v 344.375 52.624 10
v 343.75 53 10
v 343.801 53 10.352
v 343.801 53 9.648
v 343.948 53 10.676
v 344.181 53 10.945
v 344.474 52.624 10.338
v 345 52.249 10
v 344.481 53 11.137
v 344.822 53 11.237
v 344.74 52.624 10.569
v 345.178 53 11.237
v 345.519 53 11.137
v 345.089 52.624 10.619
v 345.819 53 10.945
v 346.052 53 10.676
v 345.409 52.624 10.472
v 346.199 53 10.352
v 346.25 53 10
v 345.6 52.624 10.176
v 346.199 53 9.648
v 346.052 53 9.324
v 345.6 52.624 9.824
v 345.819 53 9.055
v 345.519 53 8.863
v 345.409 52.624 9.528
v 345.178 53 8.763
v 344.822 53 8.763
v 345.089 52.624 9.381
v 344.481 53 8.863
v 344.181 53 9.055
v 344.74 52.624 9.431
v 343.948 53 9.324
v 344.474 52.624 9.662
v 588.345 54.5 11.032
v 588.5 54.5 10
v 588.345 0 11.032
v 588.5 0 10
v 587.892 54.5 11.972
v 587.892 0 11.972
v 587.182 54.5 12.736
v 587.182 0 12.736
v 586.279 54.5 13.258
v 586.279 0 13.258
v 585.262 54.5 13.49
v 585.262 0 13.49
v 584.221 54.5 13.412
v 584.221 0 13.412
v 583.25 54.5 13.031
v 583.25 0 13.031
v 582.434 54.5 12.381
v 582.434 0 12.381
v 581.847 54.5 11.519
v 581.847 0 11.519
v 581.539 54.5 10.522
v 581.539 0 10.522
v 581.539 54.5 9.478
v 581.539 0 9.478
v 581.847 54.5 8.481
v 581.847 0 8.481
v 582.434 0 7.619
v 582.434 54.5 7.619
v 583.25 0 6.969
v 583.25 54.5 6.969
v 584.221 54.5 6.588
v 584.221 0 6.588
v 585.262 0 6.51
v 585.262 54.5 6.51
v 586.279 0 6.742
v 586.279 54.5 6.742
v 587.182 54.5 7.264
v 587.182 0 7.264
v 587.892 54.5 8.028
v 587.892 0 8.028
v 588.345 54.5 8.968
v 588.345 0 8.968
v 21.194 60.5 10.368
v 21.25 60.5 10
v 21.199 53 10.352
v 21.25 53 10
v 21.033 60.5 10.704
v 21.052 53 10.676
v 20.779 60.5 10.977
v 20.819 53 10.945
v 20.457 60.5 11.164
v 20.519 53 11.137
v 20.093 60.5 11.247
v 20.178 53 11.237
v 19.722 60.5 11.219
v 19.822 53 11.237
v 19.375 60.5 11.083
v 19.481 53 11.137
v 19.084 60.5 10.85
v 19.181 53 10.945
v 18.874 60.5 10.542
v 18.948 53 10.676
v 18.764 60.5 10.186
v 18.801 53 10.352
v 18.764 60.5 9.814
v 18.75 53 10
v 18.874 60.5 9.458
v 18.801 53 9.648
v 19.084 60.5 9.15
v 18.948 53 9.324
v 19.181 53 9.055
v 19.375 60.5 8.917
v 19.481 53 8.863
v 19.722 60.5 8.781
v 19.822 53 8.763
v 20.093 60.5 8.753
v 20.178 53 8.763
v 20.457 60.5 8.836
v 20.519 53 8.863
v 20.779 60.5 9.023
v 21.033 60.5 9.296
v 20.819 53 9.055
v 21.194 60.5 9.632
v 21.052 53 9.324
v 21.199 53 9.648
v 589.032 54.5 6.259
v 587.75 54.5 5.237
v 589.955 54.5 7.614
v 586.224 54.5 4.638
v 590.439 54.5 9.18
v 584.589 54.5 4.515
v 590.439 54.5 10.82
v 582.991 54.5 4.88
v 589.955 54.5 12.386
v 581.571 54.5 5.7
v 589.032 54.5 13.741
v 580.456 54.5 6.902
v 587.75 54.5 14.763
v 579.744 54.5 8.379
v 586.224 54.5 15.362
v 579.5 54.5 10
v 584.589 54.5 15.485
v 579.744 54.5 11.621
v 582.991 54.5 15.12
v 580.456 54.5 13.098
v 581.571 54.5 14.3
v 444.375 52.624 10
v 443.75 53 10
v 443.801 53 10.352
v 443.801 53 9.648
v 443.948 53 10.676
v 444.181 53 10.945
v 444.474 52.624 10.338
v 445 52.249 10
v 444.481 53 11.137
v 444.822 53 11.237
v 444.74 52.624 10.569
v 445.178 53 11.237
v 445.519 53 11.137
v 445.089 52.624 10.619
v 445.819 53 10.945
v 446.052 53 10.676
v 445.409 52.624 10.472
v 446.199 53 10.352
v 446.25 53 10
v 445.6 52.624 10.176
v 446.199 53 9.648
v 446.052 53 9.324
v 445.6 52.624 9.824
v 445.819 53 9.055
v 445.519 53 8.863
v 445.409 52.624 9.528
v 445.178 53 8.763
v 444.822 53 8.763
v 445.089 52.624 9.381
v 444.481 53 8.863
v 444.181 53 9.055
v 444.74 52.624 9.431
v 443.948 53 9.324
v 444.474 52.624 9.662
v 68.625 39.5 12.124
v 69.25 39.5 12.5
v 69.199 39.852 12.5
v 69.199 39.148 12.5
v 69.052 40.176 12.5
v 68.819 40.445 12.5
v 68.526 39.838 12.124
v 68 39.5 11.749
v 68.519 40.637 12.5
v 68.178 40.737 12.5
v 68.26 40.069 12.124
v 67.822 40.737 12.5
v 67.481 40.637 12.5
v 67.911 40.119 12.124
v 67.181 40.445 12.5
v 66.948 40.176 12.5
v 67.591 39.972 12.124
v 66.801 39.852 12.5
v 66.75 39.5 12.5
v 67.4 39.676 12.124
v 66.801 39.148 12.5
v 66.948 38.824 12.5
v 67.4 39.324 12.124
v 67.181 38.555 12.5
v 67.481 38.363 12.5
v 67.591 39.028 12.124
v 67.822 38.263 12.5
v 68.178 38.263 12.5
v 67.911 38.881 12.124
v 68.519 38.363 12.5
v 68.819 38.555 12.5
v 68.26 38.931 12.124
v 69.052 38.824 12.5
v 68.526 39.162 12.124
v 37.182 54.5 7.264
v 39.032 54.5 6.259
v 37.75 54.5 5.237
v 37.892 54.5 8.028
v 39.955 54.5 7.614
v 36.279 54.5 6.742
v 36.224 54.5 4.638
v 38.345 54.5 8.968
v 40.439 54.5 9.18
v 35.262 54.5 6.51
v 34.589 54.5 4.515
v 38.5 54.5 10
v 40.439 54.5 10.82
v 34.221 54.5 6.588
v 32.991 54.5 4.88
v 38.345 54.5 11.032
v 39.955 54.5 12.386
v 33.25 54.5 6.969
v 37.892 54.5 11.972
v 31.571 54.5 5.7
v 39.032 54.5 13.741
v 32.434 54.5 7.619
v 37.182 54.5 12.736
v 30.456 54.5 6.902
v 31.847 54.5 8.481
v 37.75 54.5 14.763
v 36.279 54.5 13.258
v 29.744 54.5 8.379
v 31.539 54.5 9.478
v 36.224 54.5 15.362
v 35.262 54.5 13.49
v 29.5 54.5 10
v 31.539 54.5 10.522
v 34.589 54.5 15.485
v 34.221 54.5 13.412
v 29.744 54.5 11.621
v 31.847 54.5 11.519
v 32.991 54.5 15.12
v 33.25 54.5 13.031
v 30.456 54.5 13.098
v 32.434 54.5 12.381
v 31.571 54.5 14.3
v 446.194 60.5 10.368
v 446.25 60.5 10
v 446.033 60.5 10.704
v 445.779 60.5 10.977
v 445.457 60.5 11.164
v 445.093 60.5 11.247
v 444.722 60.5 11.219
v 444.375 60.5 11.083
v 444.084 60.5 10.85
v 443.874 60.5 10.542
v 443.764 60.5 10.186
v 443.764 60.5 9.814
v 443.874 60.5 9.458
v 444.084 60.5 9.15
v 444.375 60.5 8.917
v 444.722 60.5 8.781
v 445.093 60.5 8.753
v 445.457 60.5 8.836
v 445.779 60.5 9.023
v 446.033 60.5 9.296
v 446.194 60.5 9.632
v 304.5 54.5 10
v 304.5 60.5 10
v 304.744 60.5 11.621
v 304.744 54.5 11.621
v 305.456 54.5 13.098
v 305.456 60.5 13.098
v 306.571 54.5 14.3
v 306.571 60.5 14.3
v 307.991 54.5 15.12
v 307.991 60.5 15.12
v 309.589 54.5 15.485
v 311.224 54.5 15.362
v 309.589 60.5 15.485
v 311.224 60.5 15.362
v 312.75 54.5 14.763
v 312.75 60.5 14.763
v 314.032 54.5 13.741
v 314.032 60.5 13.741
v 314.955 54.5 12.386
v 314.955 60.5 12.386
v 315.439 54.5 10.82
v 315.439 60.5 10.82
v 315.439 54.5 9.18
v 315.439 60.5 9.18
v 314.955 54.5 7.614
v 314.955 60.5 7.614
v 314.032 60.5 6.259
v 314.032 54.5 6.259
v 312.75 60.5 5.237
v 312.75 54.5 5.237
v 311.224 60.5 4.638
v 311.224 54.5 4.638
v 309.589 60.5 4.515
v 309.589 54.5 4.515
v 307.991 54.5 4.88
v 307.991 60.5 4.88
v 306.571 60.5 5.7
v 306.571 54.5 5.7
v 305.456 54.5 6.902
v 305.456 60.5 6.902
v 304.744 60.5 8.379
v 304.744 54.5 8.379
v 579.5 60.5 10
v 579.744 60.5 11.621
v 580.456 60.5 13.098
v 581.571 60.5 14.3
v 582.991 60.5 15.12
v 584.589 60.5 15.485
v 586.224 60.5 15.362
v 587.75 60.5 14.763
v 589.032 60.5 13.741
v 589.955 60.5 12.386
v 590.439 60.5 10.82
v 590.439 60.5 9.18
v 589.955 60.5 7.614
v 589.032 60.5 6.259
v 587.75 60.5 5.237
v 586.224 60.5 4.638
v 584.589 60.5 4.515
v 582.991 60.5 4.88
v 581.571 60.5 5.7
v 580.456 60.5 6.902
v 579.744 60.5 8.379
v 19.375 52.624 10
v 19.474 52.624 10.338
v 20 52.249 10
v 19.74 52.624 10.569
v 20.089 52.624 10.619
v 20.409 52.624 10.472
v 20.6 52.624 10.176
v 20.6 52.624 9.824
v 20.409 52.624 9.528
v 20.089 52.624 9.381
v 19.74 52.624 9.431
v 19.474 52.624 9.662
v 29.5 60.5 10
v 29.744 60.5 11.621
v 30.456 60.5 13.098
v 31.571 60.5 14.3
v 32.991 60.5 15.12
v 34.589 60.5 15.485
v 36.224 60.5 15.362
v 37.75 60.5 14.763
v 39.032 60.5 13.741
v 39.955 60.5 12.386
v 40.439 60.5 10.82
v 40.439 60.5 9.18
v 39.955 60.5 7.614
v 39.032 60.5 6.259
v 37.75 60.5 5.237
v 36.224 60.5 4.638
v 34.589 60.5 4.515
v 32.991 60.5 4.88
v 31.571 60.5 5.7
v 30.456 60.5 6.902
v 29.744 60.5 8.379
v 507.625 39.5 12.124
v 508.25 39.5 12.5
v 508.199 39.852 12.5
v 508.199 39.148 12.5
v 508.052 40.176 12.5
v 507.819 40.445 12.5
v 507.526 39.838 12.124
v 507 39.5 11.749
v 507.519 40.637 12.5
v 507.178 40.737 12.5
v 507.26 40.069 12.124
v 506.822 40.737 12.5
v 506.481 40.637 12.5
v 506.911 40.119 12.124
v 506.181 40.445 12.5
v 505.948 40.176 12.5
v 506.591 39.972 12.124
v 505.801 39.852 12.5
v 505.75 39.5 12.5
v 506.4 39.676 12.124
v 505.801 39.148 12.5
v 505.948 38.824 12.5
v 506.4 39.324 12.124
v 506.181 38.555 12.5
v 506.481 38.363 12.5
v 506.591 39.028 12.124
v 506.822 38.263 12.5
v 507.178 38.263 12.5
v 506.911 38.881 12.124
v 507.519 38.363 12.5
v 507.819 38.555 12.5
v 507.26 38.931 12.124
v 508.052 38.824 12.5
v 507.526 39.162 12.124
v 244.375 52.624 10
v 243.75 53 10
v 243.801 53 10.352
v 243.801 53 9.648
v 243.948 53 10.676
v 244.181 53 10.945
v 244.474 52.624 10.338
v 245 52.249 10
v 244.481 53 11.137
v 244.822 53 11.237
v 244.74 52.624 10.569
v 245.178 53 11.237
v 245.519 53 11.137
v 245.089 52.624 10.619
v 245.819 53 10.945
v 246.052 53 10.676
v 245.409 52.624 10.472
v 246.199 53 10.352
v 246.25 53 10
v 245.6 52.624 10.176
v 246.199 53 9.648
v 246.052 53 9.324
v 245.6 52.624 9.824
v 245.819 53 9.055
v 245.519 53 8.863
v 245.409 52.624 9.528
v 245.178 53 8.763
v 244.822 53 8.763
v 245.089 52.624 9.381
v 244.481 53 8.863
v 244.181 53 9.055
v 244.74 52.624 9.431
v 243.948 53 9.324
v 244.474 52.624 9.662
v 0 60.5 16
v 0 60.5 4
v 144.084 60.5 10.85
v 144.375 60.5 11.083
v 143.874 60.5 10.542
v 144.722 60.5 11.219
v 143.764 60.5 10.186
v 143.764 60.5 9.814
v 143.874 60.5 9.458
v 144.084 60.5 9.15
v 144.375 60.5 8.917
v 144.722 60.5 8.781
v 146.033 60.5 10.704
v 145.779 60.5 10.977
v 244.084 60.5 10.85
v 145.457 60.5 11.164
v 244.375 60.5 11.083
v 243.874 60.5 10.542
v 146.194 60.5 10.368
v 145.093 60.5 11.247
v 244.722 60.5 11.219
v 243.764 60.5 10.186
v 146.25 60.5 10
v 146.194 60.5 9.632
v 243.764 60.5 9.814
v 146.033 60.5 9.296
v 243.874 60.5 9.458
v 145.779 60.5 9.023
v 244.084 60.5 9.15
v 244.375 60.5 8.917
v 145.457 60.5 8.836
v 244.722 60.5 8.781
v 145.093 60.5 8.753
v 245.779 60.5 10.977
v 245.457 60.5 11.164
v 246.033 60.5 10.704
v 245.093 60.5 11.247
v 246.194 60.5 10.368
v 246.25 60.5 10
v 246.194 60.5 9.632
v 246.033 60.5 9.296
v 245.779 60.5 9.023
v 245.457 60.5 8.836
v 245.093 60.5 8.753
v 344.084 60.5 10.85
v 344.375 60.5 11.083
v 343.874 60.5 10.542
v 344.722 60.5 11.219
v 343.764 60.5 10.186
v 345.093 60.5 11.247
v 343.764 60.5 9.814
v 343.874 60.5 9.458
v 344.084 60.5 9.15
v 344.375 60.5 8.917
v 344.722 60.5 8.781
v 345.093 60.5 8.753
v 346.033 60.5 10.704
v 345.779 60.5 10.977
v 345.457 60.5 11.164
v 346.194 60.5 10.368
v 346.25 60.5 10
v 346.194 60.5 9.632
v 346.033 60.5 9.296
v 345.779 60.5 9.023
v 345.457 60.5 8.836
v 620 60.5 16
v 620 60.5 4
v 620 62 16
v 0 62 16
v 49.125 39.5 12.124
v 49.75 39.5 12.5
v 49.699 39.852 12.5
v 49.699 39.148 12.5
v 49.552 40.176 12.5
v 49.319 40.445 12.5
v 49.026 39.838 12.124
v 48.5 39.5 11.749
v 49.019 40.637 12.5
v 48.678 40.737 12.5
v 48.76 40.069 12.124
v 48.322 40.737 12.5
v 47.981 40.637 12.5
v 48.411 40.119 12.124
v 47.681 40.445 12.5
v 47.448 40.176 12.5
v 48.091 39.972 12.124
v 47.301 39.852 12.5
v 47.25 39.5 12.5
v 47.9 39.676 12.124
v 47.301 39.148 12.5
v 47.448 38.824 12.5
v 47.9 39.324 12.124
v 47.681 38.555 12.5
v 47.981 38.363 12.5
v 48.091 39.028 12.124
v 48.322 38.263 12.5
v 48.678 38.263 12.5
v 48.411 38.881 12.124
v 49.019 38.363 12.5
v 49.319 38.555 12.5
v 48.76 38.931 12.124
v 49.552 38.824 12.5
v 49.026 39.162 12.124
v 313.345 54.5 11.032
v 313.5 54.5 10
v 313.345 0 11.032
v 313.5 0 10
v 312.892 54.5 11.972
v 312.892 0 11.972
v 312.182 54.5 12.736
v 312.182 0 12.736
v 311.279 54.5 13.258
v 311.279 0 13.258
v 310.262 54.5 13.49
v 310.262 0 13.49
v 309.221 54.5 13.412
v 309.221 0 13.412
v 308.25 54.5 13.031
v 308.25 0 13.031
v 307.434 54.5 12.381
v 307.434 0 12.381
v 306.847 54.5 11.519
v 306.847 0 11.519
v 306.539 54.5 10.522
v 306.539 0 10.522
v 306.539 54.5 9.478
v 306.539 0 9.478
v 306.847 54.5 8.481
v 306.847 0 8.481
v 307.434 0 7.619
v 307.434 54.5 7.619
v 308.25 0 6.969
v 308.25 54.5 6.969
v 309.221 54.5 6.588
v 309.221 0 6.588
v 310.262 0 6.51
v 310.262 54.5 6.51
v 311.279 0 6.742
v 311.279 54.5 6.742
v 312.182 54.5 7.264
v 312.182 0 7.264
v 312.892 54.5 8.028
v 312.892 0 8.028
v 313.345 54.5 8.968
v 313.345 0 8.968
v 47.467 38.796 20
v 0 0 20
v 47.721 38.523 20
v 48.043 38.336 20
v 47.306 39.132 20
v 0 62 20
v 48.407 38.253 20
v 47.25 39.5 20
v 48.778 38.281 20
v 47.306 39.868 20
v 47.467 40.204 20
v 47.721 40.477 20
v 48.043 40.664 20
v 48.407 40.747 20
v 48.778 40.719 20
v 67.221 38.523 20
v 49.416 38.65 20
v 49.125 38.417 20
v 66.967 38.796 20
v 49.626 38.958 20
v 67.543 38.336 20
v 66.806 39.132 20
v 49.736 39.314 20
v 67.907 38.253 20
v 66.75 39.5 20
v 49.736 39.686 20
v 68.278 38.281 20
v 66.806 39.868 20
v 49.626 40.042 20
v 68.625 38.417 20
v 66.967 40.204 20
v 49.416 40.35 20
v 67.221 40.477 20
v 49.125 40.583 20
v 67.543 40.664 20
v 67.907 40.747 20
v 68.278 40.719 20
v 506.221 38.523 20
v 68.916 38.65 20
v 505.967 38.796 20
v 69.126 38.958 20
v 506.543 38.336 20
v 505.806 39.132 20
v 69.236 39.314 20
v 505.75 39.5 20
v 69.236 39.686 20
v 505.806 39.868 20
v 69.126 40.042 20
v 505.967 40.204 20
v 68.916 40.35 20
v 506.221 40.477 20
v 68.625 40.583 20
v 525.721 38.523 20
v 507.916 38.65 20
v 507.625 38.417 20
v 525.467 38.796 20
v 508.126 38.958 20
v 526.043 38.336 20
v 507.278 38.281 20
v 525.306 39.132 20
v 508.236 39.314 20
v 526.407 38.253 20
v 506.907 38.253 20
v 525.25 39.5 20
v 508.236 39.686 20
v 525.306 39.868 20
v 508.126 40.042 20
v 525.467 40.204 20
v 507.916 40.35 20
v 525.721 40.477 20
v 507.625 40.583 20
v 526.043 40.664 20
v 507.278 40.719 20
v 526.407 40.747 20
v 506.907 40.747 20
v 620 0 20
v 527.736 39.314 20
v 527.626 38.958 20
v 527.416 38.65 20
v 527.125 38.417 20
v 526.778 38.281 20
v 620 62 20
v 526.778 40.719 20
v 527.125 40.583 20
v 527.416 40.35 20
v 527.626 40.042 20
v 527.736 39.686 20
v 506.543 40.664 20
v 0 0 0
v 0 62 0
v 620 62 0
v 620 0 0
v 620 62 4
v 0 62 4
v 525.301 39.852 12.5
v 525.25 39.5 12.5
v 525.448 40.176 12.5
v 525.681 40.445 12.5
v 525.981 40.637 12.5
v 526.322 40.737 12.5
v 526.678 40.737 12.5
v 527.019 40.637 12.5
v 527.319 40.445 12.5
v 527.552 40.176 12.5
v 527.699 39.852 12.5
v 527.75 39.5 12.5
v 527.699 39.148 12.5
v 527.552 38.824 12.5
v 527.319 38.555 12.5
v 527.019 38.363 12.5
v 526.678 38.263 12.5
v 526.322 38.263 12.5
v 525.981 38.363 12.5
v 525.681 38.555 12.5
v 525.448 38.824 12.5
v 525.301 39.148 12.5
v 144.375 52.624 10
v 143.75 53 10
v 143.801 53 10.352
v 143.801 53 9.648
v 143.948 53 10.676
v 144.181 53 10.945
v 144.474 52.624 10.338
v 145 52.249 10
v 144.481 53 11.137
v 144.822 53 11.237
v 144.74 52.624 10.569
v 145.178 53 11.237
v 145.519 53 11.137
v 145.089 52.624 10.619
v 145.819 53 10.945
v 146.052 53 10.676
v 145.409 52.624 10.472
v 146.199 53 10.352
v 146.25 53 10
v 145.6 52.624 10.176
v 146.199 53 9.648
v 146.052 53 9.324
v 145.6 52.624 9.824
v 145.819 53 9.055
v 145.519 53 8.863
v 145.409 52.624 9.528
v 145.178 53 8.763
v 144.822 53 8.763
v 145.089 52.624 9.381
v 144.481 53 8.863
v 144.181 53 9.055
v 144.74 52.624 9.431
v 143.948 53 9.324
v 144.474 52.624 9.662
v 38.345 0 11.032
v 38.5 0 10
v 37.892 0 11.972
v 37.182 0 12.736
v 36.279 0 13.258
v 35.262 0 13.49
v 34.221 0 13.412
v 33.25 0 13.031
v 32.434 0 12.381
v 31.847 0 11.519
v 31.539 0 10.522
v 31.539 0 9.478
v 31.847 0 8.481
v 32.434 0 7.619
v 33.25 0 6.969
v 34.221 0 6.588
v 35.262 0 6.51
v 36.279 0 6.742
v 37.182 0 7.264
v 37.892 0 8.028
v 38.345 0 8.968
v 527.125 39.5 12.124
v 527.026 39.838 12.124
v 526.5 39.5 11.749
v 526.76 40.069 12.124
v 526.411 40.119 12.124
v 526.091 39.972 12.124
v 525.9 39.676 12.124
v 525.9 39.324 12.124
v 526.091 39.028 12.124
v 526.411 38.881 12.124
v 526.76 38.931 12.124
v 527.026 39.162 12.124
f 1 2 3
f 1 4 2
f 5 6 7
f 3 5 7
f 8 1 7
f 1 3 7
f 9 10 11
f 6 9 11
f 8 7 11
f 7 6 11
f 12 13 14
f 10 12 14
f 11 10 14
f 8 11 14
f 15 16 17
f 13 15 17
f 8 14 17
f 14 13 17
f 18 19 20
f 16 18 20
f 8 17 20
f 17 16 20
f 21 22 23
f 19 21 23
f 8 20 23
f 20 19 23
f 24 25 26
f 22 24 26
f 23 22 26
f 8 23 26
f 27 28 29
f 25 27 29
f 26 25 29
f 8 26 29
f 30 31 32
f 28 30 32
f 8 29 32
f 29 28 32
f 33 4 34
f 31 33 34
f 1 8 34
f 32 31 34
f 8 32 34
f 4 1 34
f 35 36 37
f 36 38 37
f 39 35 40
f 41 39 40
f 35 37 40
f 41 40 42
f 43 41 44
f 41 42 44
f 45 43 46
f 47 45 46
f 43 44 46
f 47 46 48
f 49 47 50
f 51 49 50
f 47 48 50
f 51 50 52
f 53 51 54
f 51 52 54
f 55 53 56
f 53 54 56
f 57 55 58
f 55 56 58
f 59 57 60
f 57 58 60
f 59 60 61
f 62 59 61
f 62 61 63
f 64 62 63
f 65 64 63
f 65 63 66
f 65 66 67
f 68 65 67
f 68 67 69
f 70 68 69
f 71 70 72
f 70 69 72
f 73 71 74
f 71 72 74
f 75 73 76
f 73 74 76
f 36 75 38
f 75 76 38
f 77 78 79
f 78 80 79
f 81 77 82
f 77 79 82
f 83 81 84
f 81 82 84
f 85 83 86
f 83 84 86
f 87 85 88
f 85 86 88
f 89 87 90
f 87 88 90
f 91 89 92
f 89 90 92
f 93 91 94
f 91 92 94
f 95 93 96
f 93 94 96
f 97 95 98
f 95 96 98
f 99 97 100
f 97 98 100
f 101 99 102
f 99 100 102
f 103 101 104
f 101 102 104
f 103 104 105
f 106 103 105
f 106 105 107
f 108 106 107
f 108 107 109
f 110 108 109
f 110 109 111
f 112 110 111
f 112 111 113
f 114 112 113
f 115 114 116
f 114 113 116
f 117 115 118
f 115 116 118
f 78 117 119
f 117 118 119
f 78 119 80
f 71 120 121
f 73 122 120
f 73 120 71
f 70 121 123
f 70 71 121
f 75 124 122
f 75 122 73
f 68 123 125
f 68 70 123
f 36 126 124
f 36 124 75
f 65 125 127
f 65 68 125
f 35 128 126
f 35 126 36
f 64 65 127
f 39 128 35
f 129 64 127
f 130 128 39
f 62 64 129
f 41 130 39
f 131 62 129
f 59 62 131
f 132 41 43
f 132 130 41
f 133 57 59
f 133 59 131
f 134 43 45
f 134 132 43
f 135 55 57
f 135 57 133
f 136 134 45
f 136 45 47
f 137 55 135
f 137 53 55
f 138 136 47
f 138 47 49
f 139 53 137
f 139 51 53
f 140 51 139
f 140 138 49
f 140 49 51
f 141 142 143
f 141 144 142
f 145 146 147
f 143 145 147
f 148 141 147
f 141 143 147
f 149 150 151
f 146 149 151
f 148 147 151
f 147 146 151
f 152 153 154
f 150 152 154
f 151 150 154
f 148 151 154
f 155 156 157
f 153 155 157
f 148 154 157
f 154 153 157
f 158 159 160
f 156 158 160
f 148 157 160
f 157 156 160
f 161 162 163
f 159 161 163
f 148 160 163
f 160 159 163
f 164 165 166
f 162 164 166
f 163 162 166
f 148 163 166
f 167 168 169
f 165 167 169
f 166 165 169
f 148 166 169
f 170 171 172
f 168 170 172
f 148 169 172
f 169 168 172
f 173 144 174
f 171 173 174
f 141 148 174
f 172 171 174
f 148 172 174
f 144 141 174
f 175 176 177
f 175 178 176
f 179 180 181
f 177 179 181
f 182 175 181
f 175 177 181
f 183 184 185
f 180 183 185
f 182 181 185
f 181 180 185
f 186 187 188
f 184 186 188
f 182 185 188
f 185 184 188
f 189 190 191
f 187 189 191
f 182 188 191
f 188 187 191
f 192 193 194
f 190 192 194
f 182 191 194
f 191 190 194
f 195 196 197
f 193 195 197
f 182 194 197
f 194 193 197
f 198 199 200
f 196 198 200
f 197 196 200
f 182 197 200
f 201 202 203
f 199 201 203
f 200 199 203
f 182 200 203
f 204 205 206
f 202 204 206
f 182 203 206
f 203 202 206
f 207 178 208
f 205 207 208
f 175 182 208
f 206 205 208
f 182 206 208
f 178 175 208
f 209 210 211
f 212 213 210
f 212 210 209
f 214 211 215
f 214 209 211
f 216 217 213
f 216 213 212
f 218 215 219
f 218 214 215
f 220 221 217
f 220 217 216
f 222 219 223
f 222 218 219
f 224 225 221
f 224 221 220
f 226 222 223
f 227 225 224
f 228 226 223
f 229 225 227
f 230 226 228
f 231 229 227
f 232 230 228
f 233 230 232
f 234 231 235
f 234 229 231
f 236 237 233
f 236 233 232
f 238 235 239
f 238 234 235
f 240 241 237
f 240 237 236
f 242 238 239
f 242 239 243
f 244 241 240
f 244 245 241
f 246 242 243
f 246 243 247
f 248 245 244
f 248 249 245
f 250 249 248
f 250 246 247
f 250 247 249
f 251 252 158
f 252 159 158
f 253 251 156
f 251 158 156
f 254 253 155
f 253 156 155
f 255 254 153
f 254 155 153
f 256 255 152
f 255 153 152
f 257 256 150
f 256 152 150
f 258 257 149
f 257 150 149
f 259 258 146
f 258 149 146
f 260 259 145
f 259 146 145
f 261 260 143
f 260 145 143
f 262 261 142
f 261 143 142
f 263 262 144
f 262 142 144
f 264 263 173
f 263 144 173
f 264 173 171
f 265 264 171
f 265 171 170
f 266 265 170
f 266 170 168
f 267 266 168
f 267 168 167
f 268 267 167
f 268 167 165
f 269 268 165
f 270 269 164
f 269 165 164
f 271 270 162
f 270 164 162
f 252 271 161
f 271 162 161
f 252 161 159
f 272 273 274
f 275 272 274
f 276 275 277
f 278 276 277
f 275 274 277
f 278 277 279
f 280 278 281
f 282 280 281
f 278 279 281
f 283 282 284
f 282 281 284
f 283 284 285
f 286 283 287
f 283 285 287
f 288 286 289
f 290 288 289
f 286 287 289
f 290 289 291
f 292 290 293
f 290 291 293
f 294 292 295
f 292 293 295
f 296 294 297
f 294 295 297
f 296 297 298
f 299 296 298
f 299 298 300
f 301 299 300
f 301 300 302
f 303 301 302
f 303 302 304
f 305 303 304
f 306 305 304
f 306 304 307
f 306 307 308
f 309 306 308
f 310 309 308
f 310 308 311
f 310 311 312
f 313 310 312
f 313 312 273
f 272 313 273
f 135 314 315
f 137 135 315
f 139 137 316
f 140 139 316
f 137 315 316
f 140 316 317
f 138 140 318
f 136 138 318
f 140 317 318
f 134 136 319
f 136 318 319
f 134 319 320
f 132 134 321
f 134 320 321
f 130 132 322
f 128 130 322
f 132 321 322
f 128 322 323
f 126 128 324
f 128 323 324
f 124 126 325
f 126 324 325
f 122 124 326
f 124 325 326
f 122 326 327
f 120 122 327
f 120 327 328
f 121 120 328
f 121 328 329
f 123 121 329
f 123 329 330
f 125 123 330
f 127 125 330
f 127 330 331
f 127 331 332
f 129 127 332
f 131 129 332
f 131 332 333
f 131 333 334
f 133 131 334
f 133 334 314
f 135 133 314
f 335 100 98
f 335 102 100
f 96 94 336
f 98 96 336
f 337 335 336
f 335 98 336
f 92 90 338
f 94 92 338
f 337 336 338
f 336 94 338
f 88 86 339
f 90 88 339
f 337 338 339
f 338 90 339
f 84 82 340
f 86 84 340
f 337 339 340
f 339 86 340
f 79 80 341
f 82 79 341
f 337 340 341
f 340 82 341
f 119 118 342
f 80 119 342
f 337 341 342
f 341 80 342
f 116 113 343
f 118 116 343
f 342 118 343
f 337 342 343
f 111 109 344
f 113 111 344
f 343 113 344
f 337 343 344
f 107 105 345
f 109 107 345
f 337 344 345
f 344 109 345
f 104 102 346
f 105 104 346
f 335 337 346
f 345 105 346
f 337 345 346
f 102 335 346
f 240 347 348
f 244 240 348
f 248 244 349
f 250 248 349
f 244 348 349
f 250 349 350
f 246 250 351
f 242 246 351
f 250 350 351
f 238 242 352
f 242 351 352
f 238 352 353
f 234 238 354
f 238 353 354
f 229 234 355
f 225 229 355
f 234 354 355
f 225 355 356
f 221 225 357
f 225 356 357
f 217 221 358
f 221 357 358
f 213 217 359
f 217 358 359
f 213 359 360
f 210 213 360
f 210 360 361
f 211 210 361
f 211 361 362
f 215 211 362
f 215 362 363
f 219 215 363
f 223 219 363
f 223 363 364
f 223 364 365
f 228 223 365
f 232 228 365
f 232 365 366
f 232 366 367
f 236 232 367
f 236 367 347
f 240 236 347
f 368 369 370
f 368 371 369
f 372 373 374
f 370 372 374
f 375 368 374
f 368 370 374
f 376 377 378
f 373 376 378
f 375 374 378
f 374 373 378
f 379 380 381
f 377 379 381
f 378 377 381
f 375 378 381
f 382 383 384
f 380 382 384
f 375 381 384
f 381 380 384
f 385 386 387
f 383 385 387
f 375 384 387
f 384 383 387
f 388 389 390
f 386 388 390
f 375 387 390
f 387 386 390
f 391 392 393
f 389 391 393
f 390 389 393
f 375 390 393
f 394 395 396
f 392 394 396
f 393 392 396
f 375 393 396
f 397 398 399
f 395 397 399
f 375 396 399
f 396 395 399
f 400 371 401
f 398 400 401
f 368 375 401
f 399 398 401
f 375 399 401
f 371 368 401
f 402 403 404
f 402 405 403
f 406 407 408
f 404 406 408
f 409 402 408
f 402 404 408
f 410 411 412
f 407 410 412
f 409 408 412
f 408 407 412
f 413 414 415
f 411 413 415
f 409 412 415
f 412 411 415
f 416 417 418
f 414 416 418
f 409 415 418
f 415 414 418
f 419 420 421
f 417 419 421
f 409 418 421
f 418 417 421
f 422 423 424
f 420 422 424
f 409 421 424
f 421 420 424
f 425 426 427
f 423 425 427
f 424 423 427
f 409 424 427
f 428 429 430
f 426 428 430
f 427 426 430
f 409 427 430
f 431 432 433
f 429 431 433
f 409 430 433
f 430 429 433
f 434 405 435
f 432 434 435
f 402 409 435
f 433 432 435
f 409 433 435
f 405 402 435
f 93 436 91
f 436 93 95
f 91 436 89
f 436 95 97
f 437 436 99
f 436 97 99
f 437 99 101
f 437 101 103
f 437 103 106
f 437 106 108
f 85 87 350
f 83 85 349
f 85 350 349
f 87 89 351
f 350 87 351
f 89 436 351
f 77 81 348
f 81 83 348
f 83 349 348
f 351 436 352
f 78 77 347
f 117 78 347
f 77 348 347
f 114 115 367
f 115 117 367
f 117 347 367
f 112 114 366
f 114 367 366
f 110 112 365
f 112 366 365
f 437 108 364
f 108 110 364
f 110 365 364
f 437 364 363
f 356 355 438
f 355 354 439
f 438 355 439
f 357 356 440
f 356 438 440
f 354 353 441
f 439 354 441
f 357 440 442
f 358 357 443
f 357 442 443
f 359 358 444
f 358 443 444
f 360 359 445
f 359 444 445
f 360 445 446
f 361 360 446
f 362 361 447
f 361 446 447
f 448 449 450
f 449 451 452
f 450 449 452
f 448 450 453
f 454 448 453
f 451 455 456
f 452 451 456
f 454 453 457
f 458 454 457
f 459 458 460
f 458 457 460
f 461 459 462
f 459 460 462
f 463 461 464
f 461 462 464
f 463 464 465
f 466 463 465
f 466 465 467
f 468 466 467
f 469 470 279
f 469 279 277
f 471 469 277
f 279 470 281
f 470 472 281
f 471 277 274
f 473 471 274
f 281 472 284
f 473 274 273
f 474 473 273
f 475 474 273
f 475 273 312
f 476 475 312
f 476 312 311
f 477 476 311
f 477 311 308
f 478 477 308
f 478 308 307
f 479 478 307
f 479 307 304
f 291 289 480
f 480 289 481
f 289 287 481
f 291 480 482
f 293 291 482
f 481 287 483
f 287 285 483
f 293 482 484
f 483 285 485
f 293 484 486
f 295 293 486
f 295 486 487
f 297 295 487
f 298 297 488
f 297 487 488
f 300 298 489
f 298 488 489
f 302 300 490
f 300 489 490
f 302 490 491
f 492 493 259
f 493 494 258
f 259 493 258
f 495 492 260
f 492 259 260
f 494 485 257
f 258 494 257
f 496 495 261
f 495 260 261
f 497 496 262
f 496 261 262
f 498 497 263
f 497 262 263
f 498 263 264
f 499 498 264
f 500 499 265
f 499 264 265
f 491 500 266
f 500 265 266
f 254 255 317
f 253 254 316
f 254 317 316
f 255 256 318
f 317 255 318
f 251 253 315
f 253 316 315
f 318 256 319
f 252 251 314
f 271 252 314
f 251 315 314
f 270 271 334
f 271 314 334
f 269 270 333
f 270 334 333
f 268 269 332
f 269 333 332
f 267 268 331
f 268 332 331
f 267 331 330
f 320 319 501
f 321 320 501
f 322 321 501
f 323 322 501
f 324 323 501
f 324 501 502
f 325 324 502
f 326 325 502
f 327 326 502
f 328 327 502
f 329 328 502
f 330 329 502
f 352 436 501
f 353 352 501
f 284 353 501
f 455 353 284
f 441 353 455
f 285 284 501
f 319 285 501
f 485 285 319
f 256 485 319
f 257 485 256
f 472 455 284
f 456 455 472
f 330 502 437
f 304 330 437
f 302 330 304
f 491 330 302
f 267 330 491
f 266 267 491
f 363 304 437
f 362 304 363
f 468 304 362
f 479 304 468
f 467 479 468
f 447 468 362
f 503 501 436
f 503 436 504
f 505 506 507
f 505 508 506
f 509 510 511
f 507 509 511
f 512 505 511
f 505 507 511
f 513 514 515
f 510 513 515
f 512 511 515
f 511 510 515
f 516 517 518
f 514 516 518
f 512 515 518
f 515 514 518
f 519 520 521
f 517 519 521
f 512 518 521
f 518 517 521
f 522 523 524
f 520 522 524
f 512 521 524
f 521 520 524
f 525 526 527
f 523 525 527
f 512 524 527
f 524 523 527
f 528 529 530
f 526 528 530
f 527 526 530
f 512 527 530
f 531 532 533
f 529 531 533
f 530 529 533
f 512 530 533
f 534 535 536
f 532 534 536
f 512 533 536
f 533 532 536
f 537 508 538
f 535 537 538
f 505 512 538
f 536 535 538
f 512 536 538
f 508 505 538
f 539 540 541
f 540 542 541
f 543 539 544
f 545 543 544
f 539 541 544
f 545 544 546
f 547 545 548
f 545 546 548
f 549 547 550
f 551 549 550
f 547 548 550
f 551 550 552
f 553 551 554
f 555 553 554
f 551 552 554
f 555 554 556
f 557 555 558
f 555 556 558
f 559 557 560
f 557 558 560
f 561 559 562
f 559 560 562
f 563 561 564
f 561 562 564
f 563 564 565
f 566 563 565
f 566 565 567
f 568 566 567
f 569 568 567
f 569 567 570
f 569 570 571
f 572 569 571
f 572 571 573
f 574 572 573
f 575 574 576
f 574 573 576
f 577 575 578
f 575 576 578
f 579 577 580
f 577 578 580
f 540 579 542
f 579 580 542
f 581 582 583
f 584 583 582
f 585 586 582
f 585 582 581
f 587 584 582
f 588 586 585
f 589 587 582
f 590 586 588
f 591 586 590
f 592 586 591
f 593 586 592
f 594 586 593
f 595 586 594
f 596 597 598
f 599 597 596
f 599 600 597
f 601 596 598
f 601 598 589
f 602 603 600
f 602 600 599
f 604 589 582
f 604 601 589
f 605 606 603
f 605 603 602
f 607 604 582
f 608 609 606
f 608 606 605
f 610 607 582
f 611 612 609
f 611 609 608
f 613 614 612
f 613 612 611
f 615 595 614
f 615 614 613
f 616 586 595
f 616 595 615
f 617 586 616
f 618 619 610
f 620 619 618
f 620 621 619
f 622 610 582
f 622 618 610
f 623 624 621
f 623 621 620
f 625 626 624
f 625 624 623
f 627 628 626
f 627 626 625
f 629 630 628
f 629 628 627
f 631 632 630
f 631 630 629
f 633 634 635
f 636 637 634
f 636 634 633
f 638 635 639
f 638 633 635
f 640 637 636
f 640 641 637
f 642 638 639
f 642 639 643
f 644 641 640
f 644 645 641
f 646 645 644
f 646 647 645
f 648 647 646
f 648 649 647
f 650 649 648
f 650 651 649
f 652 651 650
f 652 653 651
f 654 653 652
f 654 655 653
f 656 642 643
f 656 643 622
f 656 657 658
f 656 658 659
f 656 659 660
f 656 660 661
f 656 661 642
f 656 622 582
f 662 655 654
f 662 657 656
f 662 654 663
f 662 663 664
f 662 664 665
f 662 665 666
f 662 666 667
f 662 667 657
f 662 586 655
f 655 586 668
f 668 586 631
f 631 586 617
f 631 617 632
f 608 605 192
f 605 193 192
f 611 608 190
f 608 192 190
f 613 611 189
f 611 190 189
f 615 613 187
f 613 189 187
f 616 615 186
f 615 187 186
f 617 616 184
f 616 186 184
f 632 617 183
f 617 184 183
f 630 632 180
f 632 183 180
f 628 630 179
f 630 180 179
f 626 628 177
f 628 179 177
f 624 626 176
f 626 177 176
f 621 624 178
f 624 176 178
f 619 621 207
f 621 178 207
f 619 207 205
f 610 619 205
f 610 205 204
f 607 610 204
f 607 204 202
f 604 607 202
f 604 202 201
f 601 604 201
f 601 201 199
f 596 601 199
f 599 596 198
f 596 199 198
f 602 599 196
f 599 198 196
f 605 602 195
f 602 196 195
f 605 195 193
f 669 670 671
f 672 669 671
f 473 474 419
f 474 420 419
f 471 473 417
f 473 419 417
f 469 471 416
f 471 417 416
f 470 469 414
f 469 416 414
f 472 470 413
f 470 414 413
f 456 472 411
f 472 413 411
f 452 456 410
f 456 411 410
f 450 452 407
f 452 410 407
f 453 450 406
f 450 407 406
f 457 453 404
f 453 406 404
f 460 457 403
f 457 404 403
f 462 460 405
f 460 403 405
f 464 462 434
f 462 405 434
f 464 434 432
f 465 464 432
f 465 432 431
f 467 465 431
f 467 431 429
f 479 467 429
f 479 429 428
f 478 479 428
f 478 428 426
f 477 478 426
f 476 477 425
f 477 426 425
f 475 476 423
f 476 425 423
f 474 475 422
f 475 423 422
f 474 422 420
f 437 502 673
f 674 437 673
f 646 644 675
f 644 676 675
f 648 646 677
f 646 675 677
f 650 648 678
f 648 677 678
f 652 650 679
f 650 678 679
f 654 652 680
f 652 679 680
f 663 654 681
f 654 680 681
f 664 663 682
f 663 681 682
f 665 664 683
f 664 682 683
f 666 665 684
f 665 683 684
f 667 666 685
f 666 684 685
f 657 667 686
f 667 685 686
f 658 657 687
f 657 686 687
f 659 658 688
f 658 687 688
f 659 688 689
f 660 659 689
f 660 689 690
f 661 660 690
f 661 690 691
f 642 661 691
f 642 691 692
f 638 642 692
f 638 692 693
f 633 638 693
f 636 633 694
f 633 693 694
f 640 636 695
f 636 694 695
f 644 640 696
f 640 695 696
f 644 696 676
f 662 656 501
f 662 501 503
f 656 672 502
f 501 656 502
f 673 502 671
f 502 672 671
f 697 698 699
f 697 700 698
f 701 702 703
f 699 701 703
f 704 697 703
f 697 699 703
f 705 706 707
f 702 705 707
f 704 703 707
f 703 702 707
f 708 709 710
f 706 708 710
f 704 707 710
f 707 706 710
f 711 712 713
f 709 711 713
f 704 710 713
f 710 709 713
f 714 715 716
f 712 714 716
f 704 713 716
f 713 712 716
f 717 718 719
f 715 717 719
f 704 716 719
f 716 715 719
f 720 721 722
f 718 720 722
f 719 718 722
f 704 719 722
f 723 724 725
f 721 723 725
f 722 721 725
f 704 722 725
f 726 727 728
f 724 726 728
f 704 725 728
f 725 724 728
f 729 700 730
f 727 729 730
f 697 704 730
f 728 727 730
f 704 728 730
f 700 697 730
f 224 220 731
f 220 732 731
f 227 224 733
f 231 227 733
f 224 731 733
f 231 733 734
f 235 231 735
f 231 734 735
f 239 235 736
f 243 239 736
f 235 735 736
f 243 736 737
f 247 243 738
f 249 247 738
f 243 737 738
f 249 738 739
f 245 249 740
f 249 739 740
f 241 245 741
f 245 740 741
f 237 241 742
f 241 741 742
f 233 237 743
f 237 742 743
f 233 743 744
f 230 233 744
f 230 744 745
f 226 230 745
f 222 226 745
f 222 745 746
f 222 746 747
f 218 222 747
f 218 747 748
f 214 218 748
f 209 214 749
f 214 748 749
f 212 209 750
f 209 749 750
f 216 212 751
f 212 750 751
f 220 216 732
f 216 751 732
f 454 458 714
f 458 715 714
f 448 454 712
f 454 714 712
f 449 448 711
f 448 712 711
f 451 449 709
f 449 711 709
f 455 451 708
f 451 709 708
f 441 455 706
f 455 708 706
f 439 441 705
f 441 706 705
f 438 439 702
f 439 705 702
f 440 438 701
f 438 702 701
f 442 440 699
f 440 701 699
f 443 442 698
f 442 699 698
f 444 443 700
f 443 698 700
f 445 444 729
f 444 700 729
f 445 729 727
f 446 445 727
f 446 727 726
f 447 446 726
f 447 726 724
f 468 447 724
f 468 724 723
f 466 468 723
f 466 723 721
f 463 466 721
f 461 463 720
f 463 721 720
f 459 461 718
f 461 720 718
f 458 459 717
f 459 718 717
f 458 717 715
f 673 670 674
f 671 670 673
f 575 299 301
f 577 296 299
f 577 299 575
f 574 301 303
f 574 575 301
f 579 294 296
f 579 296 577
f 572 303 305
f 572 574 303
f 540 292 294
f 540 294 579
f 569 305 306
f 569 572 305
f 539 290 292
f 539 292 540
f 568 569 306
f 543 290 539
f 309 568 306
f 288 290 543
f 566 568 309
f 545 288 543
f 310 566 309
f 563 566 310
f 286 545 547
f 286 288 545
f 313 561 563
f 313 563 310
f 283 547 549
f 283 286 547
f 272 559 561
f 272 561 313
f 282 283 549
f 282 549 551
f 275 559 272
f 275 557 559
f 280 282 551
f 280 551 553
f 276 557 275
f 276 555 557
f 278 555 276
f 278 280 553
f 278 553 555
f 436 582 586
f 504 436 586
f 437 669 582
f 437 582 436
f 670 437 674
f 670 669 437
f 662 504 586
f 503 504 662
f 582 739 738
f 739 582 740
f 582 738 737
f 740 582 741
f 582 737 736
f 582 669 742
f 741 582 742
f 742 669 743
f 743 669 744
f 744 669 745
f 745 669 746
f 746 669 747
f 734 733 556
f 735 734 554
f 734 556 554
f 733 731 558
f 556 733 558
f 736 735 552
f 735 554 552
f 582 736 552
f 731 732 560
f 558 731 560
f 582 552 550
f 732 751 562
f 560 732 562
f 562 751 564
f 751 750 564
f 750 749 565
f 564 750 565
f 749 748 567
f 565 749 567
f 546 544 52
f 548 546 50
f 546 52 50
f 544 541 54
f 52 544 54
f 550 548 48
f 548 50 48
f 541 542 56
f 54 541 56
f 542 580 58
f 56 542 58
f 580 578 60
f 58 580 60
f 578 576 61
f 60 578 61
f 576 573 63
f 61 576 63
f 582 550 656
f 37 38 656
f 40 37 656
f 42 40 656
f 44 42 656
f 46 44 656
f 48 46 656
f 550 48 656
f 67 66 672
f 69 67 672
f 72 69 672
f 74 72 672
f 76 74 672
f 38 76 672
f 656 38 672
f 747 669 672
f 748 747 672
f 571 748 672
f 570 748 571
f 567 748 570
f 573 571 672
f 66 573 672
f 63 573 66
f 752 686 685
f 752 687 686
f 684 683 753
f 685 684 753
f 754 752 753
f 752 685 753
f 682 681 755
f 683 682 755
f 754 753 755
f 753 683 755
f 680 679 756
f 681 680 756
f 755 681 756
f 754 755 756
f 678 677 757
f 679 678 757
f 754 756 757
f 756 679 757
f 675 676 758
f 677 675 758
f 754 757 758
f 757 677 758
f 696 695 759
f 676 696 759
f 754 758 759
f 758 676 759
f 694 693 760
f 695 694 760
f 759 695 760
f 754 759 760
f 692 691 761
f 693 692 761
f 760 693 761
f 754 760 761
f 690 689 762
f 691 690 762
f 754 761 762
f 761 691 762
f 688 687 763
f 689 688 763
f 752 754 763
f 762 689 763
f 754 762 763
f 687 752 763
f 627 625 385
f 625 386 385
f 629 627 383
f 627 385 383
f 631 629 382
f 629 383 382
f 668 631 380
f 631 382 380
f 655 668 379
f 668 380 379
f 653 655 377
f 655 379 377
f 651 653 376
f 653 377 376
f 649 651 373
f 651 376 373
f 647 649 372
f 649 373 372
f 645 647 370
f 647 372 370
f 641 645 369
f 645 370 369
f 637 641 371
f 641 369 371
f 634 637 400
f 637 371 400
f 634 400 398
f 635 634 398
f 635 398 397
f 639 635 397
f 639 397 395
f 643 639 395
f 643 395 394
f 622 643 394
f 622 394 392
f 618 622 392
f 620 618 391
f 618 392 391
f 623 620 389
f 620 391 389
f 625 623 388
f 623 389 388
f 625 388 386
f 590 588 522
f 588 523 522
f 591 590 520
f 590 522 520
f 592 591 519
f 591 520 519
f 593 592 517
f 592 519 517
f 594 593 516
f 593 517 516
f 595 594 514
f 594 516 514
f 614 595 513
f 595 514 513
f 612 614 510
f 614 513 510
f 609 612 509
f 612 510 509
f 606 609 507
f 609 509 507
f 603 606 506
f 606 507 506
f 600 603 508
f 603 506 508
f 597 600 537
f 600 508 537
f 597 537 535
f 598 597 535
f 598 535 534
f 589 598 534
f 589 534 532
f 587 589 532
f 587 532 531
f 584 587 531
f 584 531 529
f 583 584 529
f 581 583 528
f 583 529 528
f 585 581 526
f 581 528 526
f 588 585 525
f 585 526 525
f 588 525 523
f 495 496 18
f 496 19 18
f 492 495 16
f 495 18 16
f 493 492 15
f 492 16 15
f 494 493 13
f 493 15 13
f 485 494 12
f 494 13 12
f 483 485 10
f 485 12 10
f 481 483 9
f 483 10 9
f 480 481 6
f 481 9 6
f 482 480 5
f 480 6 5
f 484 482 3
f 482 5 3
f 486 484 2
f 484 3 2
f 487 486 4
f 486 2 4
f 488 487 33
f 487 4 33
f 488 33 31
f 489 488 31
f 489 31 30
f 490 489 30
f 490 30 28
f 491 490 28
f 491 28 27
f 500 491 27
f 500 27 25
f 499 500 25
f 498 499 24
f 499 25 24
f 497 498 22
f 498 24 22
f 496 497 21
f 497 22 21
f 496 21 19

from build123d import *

# Parameters (mm, degrees)
SKETCH_1_W                   = 620
SKETCH_1_H                   = 62
EXTRUDE_1_DEPTH              = 20
SKETCH_2_W                   = 12
SKETCH_2_H                   = 1.5
CUT_EXTRUDE_1_DEPTH          = 624.413185616
HOLE_WIZARD_M6_1_D           = 7
HOLE_WIZARD_M6_1_CBORE_D     = 11
HOLE_WIZARD_M6_1_CBORE_DEPTH = 6
HOLE_WIZARD_M3_1_D           = 2.5
HOLE_WIZARD_M3_1_DEPTH       = 7.5
HOLE_WIZARD_M3_1_TIP         = 0.751075774
HOLE_WIZARD_M3_2_D           = 2.5
HOLE_WIZARD_M3_2_DEPTH       = 7.5
HOLE_WIZARD_M3_2_TIP         = 0.751075774


with BuildPart() as part:
    # 草图1 → 凸台-拉伸1 (new body)
    with BuildSketch(Plane.XY):
        with Locations((310, 31)):
            Rectangle(SKETCH_1_W, SKETCH_1_H)
    extrude(amount=EXTRUDE_1_DEPTH)

    # 草图2 → 切除-拉伸1 (cut, through all)
    with BuildSketch(Plane(origin=(620, 0, 0), x_dir=(0, 0, -1), z_dir=(1, 0, 0))):
        with Locations((-10, 61.25)):
            Rectangle(SKETCH_2_W, SKETCH_2_H)
    extrude(amount=-CUT_EXTRUDE_1_DEPTH, mode=Mode.SUBTRACT)

    # M6 六角凹头螺钉的柱形沉头孔1 (through all)
    with Locations(Plane(origin=(0, 60.5, 0), x_dir=(-1, 0, 0), z_dir=(0, 1, 0))):
        with Locations((-35, 10), (-310, 10), (-585, 10)):
            CounterBoreHole(HOLE_WIZARD_M6_1_D / 2, HOLE_WIZARD_M6_1_CBORE_D / 2, HOLE_WIZARD_M6_1_CBORE_DEPTH)

    # M3 螺纹孔1
    with Locations(Plane(origin=(0, 60.5, 0), x_dir=(-1, 0, 0), z_dir=(0, 1, 0))):
        with Locations((-20, 10), (-445, 10), (-345, 10), (-245, 10), (-145, 10)):
            Hole(HOLE_WIZARD_M3_1_D / 2, depth=HOLE_WIZARD_M3_1_DEPTH)
            with Locations((0, 0, -(HOLE_WIZARD_M3_1_DEPTH + HOLE_WIZARD_M3_1_TIP / 2))):  # 118° drill point
                Cone(0, HOLE_WIZARD_M3_1_D / 2, HOLE_WIZARD_M3_1_TIP, mode=Mode.SUBTRACT)

    # M3 螺纹孔2
    with Locations(Plane.XY.offset(20)):
        with Locations((48.5, 39.5), (68, 39.5), (507, 39.5), (526.5, 39.5)):
            Hole(HOLE_WIZARD_M3_2_D / 2, depth=HOLE_WIZARD_M3_2_DEPTH)
            with Locations((0, 0, -(HOLE_WIZARD_M3_2_DEPTH + HOLE_WIZARD_M3_2_TIP / 2))):  # 118° drill point
                Cone(0, HOLE_WIZARD_M3_2_D / 2, HOLE_WIZARD_M3_2_TIP, mode=Mode.SUBTRACT)


solid = part.part
